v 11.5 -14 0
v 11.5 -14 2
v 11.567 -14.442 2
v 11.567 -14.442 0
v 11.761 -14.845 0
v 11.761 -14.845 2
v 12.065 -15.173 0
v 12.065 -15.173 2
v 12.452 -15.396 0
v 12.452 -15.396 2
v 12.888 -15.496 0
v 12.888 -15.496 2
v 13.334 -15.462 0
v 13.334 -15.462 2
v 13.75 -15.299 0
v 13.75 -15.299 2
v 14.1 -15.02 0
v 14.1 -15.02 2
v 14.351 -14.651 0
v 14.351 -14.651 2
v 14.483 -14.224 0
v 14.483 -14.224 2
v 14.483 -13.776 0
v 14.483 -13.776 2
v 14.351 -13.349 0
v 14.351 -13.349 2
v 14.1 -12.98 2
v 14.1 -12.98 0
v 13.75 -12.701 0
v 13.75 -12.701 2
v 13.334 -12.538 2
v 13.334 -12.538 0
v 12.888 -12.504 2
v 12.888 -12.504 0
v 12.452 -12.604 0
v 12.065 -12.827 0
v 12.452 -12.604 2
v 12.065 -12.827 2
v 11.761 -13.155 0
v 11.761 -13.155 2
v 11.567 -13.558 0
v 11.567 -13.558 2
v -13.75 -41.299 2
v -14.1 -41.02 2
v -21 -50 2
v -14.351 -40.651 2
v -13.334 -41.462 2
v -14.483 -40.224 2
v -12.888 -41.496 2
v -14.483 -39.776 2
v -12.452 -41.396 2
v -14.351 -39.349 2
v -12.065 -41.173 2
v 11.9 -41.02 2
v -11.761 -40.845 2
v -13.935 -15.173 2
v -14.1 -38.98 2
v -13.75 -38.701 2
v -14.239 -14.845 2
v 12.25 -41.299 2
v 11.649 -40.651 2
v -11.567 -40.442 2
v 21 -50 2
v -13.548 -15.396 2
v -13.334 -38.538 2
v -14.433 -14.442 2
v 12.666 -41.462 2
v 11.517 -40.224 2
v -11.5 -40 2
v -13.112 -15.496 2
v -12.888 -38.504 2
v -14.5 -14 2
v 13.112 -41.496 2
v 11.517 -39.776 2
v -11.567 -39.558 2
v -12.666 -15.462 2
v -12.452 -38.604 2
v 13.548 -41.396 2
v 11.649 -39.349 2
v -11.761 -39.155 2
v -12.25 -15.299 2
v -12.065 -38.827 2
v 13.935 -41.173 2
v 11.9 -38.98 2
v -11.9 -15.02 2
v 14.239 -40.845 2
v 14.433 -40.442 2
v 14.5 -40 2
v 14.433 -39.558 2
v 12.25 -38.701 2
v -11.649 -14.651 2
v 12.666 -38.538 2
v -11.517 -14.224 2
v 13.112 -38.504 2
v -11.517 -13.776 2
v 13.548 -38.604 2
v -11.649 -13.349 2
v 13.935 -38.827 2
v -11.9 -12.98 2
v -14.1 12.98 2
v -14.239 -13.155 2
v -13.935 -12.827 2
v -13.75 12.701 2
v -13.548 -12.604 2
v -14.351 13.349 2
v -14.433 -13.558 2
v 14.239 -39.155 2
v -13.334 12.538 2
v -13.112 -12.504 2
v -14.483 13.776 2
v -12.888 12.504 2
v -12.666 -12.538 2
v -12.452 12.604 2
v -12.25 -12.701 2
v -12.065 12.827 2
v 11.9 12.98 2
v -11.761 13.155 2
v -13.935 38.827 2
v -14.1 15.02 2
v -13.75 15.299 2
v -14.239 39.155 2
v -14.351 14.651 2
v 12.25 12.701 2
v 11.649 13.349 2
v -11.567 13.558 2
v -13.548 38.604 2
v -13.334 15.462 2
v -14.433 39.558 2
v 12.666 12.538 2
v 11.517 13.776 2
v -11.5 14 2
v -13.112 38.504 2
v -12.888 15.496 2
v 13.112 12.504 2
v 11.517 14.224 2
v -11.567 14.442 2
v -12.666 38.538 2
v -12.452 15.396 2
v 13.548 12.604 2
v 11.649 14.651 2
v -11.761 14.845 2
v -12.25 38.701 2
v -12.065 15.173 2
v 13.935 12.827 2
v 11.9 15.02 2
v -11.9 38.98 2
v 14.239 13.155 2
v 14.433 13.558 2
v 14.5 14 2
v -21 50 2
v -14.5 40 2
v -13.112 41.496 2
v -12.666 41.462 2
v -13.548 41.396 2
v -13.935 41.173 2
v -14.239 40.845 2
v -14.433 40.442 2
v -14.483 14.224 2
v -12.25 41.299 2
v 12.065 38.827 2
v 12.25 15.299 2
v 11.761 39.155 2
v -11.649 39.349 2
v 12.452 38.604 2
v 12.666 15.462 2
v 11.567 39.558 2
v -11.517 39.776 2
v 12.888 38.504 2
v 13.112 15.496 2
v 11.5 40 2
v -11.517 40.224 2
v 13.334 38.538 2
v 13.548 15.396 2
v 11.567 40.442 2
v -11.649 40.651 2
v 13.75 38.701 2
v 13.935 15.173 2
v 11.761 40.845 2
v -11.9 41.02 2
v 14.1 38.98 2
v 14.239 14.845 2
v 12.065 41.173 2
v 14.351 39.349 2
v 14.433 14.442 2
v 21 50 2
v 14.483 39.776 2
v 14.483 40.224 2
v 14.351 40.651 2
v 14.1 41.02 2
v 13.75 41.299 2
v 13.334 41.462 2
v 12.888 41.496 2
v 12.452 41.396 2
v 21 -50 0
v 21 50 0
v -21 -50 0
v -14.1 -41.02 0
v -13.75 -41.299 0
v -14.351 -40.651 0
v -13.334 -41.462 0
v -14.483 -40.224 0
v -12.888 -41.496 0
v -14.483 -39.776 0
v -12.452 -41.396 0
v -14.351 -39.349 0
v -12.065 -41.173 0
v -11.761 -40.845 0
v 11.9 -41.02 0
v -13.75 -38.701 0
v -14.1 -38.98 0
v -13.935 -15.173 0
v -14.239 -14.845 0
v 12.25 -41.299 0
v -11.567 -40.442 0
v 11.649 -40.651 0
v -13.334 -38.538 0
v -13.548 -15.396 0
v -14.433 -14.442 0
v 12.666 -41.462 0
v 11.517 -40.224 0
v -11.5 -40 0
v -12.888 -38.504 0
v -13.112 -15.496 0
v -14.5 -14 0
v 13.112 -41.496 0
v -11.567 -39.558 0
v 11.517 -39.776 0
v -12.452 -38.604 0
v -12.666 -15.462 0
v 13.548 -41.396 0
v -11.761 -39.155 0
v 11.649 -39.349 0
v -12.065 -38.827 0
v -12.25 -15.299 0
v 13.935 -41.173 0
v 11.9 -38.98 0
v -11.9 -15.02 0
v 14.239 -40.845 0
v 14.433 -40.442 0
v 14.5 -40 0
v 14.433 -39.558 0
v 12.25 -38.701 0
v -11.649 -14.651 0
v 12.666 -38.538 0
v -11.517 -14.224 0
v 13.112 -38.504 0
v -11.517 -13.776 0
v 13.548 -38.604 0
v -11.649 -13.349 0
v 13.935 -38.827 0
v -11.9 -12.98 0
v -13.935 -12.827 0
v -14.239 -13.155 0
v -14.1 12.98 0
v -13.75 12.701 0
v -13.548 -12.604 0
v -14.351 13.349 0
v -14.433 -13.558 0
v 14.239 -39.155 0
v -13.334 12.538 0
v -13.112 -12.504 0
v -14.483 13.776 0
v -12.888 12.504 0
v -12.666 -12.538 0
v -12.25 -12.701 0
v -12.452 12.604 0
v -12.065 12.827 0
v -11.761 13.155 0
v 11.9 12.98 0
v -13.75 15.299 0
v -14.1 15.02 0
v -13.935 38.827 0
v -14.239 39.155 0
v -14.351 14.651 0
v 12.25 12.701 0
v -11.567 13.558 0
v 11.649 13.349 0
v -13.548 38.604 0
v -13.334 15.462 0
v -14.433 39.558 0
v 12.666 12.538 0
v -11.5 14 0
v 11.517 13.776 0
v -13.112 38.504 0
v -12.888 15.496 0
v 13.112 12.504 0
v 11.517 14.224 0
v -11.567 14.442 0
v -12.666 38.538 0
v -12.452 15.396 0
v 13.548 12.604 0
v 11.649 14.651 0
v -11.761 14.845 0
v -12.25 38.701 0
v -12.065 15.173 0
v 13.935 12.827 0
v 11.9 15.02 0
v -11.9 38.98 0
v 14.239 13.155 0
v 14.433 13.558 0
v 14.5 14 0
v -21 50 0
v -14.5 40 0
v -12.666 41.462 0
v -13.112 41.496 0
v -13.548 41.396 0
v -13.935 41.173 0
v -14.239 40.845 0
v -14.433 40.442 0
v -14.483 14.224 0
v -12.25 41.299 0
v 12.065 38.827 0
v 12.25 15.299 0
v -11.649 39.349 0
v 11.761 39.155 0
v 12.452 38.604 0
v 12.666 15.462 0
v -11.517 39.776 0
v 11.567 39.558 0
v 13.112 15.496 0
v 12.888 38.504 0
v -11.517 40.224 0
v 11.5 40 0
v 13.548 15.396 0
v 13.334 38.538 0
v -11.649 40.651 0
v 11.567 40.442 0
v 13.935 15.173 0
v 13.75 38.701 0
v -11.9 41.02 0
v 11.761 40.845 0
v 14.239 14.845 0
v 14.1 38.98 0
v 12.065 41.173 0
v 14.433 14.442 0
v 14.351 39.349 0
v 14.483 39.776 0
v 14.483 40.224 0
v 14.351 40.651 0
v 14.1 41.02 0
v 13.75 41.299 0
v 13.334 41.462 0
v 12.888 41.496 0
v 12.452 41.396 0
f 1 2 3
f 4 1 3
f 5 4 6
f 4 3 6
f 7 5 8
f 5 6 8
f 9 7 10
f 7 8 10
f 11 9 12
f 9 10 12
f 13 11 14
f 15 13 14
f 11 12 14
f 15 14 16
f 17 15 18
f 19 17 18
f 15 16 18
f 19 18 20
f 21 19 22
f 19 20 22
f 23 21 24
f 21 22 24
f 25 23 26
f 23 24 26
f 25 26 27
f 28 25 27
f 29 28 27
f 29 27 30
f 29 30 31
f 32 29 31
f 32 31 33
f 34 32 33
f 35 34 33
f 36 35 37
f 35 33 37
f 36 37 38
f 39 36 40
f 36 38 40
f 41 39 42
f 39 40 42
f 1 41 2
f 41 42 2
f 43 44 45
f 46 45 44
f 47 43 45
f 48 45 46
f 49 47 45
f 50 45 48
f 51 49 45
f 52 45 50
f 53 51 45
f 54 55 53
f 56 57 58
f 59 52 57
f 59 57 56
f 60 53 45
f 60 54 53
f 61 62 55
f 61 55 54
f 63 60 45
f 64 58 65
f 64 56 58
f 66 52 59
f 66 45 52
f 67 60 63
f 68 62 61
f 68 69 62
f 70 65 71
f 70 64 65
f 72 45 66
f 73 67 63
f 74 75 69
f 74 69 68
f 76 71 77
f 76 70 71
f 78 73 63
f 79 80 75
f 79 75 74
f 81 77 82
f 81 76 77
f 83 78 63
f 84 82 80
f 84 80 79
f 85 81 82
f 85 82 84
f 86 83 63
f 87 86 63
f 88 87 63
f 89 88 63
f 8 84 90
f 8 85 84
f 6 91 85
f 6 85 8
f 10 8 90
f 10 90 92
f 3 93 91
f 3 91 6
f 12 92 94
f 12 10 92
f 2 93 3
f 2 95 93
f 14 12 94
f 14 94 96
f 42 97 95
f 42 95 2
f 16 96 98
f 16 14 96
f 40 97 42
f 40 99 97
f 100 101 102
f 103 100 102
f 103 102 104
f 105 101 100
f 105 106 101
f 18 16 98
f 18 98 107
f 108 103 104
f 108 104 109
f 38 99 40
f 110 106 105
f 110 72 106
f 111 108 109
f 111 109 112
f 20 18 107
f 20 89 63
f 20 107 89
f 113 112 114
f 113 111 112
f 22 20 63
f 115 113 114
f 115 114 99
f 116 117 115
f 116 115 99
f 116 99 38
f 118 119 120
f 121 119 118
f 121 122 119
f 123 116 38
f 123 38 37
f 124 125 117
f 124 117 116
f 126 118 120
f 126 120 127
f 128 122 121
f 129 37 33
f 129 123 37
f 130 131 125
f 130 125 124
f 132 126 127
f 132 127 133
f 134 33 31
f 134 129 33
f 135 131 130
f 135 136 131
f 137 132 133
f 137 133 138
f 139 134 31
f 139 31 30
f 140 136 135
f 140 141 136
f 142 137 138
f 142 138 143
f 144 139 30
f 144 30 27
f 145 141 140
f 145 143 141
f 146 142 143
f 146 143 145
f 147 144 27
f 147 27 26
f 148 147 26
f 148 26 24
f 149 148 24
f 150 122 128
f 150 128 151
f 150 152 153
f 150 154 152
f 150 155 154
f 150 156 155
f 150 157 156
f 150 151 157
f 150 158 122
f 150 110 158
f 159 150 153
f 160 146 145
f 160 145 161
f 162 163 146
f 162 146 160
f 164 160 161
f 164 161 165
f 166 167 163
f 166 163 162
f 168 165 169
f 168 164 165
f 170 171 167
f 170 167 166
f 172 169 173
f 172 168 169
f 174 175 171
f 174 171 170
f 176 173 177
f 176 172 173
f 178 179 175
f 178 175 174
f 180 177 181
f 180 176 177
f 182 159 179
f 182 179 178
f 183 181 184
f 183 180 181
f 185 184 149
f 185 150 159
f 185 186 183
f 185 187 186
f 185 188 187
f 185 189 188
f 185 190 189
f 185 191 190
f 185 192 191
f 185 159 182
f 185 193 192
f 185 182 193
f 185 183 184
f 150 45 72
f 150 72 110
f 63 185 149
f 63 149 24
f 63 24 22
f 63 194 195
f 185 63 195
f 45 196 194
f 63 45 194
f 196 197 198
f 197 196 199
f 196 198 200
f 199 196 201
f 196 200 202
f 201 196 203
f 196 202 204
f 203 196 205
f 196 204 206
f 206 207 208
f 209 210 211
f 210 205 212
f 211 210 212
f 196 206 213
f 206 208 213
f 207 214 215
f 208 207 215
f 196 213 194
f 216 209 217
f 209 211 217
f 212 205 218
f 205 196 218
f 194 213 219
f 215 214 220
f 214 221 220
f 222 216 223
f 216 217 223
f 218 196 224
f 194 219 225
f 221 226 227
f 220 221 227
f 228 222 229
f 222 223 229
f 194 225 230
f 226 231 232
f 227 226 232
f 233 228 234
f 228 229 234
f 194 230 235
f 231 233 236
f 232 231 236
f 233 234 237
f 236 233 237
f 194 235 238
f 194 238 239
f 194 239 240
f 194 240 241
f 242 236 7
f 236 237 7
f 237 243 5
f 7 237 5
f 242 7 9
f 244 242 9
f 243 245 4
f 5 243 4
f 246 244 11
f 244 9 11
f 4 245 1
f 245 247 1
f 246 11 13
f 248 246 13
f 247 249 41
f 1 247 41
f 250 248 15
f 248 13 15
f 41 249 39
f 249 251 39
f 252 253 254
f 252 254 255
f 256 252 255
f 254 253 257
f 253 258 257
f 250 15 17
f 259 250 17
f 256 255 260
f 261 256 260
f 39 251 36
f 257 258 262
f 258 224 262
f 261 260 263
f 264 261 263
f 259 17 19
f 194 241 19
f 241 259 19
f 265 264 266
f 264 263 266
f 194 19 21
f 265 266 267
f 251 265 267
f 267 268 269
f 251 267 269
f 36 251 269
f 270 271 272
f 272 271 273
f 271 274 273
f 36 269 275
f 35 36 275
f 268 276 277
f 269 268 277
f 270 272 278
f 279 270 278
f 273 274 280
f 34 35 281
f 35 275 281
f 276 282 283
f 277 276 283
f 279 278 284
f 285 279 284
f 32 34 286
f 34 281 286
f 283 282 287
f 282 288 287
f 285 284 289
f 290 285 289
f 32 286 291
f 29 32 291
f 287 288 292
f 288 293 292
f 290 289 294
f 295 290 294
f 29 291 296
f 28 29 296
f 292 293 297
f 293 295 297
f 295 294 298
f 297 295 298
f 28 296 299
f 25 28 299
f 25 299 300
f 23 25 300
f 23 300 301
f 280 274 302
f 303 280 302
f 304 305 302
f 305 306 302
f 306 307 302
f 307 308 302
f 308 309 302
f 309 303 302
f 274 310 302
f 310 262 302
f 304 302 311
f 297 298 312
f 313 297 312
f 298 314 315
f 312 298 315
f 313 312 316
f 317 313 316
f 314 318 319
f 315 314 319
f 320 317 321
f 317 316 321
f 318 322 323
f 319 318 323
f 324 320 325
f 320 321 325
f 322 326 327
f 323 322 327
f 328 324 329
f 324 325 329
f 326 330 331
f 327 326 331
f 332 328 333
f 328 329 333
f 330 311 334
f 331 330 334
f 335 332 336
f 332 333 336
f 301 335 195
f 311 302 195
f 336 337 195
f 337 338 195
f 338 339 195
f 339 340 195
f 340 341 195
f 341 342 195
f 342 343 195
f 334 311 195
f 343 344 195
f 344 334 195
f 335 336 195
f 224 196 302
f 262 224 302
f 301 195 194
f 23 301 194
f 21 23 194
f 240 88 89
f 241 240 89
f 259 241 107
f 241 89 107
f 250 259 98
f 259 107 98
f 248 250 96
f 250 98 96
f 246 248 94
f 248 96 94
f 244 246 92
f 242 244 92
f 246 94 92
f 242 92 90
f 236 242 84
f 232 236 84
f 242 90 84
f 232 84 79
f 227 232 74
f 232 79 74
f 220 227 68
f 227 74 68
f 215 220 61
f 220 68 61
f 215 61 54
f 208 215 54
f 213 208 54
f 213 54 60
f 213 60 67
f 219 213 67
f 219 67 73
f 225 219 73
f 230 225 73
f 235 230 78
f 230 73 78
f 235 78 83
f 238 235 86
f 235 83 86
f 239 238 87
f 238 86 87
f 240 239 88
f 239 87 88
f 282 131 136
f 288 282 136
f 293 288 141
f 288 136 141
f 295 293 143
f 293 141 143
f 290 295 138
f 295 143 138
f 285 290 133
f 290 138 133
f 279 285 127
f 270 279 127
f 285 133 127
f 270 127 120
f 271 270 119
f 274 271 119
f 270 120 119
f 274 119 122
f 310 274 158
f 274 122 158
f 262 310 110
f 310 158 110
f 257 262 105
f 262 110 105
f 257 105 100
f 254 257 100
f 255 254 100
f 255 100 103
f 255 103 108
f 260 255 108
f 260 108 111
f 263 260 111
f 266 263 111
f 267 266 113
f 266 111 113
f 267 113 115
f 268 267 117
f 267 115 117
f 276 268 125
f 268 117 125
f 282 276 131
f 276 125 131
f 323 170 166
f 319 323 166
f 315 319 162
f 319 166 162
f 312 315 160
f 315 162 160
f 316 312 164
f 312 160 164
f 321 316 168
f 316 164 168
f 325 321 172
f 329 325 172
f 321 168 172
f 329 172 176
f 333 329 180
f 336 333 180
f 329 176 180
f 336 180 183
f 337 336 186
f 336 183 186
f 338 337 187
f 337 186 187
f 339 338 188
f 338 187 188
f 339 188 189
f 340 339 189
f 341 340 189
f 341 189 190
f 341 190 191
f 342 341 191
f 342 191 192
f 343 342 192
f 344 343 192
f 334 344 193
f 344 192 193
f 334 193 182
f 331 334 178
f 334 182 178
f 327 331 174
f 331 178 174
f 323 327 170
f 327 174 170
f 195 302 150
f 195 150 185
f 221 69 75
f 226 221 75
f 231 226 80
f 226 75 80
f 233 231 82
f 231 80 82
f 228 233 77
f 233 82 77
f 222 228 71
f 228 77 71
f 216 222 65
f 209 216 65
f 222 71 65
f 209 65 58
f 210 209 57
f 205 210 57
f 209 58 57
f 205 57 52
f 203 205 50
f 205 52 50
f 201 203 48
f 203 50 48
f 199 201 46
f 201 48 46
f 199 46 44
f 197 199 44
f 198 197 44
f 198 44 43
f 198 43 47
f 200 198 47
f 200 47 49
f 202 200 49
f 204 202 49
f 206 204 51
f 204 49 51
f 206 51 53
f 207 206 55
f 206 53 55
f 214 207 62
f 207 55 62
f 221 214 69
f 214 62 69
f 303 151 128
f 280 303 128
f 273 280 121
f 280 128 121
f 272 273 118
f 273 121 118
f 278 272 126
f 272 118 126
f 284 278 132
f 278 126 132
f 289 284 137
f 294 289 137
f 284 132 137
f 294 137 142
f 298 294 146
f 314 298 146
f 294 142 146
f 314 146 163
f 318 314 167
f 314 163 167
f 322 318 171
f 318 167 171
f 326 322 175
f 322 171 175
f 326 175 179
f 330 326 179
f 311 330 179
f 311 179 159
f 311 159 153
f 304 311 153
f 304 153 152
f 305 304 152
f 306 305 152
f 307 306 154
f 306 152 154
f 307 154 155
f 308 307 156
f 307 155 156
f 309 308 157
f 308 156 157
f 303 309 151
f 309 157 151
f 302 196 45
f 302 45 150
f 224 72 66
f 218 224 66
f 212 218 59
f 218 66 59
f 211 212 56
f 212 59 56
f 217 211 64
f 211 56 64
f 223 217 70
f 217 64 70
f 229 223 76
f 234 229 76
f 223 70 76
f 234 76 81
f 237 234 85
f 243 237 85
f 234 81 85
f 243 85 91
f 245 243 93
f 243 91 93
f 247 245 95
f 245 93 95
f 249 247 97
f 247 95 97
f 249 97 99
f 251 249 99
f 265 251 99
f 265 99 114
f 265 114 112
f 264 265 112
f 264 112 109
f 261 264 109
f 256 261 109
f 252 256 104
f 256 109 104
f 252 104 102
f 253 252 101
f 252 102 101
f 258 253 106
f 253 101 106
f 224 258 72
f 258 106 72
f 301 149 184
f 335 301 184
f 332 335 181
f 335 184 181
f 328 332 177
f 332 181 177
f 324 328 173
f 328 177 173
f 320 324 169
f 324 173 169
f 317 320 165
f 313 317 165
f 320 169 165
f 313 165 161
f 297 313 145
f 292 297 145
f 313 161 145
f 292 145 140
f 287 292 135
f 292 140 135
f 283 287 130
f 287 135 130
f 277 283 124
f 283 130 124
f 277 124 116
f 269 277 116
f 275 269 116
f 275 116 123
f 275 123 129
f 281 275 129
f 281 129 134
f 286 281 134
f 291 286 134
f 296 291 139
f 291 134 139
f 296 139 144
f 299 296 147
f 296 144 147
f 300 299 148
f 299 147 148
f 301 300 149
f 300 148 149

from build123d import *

# Parameters (mm, degrees)
SKETCH1_W           = 42
SKETCH1_H           = 100
BOSS_EXTRUDE1_DEPTH = 2
SKETCH2_R           = 1.5
CUT_EXTRUDE1_DEPTH  = 2


with BuildPart() as part:
    # Sketch1 → Boss-Extrude1 (new body)
    with BuildSketch(Plane.XY):
        Rectangle(SKETCH1_W, SKETCH1_H)
    extrude(amount=BOSS_EXTRUDE1_DEPTH)

    # Sketch2 → Cut-Extrude1 (cut)
    with BuildSketch(Plane.XY.offset(2)):
        with Locations((-13, -40)):
            Circle(SKETCH2_R)
        with Locations((13, -40)):
            Circle(SKETCH2_R)
        with Locations(Location((13, -14, 0), (0, 0, 180))):
            Circle(SKETCH2_R)
        with Locations(Location((-13, -14, 0), (0, 0, 180))):
            Circle(SKETCH2_R)
        with Locations(Location((13, 40, 0), (0, 0, 180))):
            Circle(SKETCH2_R)
        with Locations(Location((-13, 40, 0), (0, 0, 180))):
            Circle(SKETCH2_R)
        with Locations((13, 14)):
            Circle(SKETCH2_R)
        with Locations((-13, 14)):
            Circle(SKETCH2_R)
    extrude(amount=-CUT_EXTRUDE1_DEPTH, mode=Mode.SUBTRACT)


solid = part.part
